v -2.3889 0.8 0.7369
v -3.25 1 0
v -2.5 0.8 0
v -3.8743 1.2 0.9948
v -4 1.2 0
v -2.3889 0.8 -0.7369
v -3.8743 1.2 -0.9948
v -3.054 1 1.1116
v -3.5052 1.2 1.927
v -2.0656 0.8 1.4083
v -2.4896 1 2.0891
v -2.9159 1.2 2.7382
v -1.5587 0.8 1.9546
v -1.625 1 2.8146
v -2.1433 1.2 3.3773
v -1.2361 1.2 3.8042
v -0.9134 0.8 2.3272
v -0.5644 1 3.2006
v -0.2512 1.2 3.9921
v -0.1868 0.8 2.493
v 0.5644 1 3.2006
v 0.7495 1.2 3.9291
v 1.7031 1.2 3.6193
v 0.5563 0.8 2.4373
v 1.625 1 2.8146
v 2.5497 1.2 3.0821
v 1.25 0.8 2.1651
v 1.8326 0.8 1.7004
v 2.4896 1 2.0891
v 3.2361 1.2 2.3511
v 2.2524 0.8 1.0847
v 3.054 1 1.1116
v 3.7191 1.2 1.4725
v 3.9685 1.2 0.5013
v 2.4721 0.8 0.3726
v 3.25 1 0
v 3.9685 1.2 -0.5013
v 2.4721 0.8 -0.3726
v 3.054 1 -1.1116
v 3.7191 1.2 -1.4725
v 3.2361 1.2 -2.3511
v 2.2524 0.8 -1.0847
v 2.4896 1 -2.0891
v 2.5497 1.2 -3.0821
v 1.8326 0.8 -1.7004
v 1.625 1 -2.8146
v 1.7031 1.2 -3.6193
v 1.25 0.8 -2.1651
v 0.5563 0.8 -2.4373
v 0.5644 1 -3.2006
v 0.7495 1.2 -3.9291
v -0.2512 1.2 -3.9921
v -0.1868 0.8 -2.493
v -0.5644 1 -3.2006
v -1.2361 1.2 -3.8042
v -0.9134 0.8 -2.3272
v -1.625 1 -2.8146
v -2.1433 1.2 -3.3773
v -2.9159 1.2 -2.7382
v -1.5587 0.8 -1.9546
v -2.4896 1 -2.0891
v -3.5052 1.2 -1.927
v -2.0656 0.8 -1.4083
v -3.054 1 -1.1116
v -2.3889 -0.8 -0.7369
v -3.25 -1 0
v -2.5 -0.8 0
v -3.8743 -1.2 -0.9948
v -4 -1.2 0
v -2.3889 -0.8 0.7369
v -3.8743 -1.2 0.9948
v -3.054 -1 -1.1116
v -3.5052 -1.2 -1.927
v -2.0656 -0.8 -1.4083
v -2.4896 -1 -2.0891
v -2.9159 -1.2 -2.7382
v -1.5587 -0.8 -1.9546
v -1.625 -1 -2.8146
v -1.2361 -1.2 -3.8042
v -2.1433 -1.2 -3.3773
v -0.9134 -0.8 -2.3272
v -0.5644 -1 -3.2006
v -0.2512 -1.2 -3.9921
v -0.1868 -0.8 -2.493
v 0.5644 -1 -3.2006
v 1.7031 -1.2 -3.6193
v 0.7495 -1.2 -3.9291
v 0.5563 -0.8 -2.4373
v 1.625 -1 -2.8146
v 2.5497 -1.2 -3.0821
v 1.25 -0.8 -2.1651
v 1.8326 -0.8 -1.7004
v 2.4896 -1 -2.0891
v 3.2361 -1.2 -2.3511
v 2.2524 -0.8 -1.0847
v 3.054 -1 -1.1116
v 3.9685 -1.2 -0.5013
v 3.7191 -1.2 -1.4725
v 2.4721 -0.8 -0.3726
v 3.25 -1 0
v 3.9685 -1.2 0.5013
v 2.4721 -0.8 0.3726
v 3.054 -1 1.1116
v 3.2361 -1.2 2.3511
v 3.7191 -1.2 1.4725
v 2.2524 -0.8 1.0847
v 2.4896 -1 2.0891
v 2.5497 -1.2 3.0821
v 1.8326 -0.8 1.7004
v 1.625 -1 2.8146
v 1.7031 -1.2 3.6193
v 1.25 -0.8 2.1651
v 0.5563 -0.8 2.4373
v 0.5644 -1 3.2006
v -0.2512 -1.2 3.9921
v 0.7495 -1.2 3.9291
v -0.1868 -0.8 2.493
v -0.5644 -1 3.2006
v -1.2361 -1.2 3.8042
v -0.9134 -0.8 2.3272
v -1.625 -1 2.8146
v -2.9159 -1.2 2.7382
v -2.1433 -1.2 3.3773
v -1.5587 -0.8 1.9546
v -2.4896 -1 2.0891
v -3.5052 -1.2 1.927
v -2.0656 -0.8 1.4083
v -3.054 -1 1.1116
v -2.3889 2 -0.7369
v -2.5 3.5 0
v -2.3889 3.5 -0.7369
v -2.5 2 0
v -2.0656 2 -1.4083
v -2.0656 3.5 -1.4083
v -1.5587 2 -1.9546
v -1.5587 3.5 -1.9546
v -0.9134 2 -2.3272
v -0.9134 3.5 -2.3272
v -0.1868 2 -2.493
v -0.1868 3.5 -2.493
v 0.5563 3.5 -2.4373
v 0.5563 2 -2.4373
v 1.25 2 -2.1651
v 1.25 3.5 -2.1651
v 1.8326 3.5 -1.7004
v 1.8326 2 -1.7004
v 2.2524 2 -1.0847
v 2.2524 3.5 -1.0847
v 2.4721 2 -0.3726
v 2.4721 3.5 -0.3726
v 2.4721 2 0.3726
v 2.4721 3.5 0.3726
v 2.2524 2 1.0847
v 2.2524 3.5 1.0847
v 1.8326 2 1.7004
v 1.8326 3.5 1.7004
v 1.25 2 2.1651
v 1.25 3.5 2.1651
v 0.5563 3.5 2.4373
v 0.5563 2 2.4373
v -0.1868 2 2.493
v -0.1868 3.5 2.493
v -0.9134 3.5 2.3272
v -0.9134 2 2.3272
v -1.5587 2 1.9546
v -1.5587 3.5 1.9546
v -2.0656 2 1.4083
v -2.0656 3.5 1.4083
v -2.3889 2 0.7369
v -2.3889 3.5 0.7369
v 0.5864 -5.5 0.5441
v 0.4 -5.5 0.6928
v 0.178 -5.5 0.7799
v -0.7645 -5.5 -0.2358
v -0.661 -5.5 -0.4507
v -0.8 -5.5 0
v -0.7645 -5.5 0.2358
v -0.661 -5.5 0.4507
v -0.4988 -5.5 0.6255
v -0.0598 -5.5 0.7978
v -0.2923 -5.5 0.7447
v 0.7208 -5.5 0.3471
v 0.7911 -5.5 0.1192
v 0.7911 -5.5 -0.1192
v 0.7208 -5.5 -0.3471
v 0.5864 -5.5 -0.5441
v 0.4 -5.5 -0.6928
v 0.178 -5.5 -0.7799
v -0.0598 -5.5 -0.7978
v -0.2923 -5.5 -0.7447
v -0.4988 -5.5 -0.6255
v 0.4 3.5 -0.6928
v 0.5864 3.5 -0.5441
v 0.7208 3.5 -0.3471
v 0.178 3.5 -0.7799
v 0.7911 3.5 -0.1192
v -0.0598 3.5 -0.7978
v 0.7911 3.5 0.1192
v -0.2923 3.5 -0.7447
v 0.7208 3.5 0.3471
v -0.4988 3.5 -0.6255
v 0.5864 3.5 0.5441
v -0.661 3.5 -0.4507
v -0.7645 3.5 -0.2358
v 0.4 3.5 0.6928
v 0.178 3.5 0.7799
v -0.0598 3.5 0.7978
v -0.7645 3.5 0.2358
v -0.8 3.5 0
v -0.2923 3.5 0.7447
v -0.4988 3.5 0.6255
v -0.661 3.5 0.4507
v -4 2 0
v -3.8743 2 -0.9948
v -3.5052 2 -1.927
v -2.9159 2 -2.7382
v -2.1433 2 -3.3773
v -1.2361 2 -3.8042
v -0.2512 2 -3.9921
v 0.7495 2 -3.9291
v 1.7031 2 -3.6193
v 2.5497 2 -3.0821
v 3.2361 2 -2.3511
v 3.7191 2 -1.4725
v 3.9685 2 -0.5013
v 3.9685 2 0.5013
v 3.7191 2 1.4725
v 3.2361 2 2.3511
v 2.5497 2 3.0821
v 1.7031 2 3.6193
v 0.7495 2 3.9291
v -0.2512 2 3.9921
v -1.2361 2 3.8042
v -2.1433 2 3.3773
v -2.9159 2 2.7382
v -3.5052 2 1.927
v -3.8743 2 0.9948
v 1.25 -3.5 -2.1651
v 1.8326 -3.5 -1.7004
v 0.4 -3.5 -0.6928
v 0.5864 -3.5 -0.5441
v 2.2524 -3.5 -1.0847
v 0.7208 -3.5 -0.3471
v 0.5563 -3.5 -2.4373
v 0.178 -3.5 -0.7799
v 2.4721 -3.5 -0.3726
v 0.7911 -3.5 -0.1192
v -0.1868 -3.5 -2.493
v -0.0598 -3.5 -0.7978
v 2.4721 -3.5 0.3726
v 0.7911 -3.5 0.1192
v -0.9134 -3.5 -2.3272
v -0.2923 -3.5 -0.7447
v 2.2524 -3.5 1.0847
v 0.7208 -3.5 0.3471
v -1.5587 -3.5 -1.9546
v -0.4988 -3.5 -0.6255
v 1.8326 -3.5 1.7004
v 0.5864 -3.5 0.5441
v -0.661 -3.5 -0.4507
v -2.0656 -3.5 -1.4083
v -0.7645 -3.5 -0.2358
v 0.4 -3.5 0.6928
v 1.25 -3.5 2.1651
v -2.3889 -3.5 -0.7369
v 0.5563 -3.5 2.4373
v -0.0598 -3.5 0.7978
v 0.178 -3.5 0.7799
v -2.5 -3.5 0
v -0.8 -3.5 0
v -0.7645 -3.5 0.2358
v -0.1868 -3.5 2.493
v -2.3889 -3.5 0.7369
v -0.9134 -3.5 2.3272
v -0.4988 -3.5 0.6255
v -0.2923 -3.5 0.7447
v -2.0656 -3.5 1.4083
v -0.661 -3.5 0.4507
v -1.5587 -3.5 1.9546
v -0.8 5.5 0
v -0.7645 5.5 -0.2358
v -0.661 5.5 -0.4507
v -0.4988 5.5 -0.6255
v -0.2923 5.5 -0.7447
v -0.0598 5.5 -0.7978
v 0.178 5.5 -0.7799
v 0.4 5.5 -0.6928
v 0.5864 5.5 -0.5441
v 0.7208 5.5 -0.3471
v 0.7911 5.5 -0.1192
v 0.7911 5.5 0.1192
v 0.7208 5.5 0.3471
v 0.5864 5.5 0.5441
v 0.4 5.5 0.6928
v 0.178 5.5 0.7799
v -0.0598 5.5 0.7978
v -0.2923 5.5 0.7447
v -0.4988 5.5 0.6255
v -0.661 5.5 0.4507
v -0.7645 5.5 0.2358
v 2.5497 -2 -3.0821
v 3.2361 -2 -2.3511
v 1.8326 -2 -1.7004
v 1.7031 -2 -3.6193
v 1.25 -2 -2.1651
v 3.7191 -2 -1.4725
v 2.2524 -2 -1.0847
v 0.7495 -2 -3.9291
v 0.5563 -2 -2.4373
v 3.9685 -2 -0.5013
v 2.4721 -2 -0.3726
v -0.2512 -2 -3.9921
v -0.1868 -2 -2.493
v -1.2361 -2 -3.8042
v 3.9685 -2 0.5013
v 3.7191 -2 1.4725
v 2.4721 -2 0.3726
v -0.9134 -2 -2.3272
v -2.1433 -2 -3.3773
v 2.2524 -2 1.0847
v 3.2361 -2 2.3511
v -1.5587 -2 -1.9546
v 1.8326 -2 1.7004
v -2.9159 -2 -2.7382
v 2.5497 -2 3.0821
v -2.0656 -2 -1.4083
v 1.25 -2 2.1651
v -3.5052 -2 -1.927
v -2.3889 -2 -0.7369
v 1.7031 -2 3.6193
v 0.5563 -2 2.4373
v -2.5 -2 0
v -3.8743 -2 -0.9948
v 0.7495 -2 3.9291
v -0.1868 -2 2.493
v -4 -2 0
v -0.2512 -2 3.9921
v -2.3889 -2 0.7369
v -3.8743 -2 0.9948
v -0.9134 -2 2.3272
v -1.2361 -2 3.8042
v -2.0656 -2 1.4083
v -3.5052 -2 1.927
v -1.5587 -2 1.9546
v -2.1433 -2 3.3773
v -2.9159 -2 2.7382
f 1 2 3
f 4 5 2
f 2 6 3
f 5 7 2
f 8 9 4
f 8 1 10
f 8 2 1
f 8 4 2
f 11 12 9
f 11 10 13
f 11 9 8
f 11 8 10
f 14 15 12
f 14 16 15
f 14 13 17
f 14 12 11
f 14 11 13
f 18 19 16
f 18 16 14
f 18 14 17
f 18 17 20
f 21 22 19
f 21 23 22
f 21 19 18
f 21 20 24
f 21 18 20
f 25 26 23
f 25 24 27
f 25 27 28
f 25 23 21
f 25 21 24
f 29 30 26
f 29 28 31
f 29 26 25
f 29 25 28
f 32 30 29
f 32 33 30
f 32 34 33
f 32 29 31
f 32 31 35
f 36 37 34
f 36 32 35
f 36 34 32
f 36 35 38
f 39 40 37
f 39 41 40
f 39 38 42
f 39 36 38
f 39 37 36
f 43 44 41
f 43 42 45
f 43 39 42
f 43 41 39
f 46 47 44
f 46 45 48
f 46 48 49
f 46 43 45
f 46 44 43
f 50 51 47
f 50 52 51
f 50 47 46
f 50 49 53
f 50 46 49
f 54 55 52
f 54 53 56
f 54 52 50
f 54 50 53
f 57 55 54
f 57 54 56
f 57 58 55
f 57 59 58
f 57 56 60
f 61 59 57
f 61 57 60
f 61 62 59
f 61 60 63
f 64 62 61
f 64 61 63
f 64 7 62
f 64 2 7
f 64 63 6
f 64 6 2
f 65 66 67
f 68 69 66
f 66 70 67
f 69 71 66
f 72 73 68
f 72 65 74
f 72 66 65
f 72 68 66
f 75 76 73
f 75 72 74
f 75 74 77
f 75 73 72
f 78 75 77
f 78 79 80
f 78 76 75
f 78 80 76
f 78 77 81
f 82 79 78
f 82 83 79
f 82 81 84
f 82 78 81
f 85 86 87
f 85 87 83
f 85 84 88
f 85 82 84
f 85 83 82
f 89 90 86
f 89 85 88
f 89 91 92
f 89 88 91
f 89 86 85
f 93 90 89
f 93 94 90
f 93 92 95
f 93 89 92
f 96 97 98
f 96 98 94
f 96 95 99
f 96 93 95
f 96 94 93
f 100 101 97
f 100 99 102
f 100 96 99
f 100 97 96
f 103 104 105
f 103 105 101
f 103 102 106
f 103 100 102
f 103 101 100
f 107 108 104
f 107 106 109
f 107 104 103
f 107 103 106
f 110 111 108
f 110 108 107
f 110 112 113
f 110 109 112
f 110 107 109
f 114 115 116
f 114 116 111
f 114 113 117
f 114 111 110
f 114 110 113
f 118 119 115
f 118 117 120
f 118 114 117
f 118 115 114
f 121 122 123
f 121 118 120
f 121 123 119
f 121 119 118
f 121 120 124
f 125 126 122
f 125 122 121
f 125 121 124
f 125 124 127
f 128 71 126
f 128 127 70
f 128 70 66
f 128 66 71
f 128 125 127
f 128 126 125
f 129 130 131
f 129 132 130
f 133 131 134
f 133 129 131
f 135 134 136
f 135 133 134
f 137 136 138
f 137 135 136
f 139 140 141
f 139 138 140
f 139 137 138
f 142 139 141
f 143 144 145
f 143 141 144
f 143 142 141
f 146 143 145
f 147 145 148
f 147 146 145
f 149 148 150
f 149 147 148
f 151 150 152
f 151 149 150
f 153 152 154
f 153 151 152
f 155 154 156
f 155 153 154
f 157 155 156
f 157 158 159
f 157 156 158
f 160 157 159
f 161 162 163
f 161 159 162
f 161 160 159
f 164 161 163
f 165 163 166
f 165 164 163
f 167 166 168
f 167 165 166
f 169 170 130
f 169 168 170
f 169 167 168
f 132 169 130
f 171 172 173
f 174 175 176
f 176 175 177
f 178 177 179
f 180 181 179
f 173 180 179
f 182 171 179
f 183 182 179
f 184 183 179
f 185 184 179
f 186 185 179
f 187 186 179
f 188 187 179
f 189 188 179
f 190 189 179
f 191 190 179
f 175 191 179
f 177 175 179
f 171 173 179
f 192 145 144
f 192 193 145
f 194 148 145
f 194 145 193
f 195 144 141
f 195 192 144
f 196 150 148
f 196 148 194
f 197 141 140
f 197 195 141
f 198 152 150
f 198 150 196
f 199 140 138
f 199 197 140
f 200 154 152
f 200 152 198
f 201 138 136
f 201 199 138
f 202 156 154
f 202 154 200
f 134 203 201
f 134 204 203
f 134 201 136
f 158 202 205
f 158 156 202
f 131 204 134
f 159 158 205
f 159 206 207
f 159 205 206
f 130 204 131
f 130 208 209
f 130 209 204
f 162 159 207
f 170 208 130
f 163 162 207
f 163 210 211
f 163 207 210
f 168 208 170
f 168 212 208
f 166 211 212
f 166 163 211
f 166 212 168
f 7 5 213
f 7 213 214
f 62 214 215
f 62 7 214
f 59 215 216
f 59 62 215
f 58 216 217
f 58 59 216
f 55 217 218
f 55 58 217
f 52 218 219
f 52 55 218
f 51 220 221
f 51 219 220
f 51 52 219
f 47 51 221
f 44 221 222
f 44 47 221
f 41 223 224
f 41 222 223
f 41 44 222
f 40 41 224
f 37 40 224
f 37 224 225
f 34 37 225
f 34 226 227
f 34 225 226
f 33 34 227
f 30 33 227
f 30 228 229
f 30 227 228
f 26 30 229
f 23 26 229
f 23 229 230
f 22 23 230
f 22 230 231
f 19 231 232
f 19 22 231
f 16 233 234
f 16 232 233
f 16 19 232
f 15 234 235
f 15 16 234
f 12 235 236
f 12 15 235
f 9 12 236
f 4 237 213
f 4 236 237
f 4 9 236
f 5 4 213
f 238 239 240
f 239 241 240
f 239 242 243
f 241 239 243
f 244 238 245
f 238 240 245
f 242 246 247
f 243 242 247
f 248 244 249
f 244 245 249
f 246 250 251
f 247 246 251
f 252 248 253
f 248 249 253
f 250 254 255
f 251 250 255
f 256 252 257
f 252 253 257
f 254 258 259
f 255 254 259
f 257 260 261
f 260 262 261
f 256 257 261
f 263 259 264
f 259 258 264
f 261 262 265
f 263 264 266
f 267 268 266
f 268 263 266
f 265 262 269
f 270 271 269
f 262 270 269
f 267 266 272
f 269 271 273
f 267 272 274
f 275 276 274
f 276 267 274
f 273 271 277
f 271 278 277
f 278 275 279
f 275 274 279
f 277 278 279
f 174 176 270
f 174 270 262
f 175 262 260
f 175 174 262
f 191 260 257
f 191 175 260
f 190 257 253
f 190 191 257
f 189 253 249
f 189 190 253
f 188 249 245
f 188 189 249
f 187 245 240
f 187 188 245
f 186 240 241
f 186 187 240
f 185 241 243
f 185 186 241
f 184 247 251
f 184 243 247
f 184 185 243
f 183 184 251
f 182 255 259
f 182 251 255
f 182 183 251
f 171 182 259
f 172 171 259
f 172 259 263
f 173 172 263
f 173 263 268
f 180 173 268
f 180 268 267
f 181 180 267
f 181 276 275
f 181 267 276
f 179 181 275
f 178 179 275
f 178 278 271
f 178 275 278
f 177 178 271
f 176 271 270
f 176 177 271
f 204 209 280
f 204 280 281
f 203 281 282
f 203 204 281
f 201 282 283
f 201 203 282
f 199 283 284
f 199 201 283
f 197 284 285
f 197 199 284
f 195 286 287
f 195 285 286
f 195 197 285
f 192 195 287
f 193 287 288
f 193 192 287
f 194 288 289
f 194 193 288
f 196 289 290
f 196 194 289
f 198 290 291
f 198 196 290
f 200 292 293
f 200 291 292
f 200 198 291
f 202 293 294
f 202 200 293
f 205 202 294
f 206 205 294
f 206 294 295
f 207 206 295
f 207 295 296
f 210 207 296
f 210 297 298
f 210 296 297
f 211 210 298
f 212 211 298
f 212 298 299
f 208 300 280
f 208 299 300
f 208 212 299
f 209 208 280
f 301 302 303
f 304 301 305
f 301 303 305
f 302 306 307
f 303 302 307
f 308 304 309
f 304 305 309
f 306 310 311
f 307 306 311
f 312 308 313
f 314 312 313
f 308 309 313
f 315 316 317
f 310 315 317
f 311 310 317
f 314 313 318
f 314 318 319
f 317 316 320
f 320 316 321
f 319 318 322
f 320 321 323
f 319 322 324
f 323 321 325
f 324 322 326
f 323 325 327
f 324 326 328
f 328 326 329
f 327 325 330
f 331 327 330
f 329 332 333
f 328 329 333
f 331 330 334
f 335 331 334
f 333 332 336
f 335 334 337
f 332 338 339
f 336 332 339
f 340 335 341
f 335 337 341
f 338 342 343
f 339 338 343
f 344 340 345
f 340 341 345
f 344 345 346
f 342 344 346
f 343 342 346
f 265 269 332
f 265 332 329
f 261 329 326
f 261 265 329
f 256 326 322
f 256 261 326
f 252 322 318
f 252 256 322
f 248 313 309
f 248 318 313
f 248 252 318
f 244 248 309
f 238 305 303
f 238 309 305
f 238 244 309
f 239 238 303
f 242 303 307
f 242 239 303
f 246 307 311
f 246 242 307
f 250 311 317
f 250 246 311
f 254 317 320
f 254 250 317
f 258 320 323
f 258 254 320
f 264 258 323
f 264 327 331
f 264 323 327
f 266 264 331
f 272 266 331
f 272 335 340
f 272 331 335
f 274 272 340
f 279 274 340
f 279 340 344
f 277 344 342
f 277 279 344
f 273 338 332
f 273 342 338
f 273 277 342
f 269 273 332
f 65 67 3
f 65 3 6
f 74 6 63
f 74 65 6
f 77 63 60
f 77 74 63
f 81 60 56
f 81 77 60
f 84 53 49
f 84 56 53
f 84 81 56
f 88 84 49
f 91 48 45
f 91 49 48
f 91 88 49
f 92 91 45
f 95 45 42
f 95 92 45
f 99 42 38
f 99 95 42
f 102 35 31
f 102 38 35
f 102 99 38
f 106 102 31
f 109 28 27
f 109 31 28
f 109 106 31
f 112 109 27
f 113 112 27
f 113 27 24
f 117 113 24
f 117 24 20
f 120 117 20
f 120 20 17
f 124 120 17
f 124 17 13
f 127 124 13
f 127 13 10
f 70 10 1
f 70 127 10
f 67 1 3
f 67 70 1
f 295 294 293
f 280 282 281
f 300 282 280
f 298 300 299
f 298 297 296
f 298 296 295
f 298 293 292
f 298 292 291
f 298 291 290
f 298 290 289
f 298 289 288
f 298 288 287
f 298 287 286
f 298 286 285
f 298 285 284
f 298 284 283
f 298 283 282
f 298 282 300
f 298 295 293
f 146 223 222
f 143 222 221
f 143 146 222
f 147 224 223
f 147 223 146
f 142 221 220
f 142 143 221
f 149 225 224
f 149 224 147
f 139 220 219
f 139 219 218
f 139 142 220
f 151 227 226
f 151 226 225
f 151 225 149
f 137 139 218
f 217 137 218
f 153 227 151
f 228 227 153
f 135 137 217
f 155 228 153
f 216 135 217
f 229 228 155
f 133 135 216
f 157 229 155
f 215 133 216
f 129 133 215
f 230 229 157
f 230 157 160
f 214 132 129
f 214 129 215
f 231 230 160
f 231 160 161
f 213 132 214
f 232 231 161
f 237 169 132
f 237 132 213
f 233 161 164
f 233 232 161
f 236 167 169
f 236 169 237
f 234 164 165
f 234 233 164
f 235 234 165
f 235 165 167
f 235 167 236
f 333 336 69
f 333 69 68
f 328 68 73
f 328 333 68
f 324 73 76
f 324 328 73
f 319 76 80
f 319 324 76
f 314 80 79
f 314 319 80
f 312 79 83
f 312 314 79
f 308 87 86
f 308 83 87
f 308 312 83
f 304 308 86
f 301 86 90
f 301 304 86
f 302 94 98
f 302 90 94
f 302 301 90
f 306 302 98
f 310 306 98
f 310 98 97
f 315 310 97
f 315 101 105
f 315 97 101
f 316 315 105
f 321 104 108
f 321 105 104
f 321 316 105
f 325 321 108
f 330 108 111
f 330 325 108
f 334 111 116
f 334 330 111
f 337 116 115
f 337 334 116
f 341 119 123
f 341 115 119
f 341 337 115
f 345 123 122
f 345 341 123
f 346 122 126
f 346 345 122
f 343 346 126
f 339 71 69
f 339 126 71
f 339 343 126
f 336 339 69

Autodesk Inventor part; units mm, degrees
ref_plane "YZ Plane" through (0, 0, 0) normal (1, 0, 0) x (0, 1, 0)
ref_plane "XZ Plane" through (0, 0, 0) normal (0, 1, 0) x (-1, 0, 0)
ref_plane "XY Plane" through (0, 0, 0) normal (0, 0, 1) x (1, 0, 0)
sketch "Sketch1" plane through (0, 0, 0) normal (0, 0, 1) x (1, 0, 0)
  line L0 (0, -5.5) -> (0, 5.5)
  line L1 (0, 5.5) -> (-0.8, 5.5)
  line L2 (-0.8, 5.5) -> (-0.8, 3.5)
  line L3 (-0.8, 3.5) -> (-2.5, 3.5)
  line L4 (-2.5, 3.5) -> (-2.5, 2)
  line L5 (-2.5, 2) -> (-4, 2)
  line L6 (-4, 2) -> (-4, 1.2)
  line L7 (-4, 1.2) -> (-2.5, 0.8)
  line L8 (-2.5, 0.8) -> (-2.5, -0.8)
  line L9 (-2.5, -0.8) -> (-4, -1.2)
  line L10 (-4, -1.2) -> (-4, -2)
  line L11 (-4, -2) -> (-2.5, -2)
  line L12 (-2.5, -2) -> (-2.5, -3.5)
  line L13 (-2.5, -3.5) -> (-0.8, -3.5)
  line L14 (-0.8, -3.5) -> (-0.8, -5.5)
  line L15 (-0.8, -5.5) -> (0, -5.5)
  point P0 (0, 0)
  point P1 (0, 0)
  point P2 (-2.5, 0)
  dimension "d0" = 11
  dimension "d1" = 5
  dimension "d2" = 1.6
  dimension "d3" = 7
  dimension "d4" = 8
  dimension "d5" = 4
  dimension "d6" = 1.6
  dimension "d7" = 0.8
revolve "Revolution1" add sketch "Sketch1" angle 360 about axis through (0, -5.5, 0) along (0, 1, 0)
properties part number "3464" material "Steel"
